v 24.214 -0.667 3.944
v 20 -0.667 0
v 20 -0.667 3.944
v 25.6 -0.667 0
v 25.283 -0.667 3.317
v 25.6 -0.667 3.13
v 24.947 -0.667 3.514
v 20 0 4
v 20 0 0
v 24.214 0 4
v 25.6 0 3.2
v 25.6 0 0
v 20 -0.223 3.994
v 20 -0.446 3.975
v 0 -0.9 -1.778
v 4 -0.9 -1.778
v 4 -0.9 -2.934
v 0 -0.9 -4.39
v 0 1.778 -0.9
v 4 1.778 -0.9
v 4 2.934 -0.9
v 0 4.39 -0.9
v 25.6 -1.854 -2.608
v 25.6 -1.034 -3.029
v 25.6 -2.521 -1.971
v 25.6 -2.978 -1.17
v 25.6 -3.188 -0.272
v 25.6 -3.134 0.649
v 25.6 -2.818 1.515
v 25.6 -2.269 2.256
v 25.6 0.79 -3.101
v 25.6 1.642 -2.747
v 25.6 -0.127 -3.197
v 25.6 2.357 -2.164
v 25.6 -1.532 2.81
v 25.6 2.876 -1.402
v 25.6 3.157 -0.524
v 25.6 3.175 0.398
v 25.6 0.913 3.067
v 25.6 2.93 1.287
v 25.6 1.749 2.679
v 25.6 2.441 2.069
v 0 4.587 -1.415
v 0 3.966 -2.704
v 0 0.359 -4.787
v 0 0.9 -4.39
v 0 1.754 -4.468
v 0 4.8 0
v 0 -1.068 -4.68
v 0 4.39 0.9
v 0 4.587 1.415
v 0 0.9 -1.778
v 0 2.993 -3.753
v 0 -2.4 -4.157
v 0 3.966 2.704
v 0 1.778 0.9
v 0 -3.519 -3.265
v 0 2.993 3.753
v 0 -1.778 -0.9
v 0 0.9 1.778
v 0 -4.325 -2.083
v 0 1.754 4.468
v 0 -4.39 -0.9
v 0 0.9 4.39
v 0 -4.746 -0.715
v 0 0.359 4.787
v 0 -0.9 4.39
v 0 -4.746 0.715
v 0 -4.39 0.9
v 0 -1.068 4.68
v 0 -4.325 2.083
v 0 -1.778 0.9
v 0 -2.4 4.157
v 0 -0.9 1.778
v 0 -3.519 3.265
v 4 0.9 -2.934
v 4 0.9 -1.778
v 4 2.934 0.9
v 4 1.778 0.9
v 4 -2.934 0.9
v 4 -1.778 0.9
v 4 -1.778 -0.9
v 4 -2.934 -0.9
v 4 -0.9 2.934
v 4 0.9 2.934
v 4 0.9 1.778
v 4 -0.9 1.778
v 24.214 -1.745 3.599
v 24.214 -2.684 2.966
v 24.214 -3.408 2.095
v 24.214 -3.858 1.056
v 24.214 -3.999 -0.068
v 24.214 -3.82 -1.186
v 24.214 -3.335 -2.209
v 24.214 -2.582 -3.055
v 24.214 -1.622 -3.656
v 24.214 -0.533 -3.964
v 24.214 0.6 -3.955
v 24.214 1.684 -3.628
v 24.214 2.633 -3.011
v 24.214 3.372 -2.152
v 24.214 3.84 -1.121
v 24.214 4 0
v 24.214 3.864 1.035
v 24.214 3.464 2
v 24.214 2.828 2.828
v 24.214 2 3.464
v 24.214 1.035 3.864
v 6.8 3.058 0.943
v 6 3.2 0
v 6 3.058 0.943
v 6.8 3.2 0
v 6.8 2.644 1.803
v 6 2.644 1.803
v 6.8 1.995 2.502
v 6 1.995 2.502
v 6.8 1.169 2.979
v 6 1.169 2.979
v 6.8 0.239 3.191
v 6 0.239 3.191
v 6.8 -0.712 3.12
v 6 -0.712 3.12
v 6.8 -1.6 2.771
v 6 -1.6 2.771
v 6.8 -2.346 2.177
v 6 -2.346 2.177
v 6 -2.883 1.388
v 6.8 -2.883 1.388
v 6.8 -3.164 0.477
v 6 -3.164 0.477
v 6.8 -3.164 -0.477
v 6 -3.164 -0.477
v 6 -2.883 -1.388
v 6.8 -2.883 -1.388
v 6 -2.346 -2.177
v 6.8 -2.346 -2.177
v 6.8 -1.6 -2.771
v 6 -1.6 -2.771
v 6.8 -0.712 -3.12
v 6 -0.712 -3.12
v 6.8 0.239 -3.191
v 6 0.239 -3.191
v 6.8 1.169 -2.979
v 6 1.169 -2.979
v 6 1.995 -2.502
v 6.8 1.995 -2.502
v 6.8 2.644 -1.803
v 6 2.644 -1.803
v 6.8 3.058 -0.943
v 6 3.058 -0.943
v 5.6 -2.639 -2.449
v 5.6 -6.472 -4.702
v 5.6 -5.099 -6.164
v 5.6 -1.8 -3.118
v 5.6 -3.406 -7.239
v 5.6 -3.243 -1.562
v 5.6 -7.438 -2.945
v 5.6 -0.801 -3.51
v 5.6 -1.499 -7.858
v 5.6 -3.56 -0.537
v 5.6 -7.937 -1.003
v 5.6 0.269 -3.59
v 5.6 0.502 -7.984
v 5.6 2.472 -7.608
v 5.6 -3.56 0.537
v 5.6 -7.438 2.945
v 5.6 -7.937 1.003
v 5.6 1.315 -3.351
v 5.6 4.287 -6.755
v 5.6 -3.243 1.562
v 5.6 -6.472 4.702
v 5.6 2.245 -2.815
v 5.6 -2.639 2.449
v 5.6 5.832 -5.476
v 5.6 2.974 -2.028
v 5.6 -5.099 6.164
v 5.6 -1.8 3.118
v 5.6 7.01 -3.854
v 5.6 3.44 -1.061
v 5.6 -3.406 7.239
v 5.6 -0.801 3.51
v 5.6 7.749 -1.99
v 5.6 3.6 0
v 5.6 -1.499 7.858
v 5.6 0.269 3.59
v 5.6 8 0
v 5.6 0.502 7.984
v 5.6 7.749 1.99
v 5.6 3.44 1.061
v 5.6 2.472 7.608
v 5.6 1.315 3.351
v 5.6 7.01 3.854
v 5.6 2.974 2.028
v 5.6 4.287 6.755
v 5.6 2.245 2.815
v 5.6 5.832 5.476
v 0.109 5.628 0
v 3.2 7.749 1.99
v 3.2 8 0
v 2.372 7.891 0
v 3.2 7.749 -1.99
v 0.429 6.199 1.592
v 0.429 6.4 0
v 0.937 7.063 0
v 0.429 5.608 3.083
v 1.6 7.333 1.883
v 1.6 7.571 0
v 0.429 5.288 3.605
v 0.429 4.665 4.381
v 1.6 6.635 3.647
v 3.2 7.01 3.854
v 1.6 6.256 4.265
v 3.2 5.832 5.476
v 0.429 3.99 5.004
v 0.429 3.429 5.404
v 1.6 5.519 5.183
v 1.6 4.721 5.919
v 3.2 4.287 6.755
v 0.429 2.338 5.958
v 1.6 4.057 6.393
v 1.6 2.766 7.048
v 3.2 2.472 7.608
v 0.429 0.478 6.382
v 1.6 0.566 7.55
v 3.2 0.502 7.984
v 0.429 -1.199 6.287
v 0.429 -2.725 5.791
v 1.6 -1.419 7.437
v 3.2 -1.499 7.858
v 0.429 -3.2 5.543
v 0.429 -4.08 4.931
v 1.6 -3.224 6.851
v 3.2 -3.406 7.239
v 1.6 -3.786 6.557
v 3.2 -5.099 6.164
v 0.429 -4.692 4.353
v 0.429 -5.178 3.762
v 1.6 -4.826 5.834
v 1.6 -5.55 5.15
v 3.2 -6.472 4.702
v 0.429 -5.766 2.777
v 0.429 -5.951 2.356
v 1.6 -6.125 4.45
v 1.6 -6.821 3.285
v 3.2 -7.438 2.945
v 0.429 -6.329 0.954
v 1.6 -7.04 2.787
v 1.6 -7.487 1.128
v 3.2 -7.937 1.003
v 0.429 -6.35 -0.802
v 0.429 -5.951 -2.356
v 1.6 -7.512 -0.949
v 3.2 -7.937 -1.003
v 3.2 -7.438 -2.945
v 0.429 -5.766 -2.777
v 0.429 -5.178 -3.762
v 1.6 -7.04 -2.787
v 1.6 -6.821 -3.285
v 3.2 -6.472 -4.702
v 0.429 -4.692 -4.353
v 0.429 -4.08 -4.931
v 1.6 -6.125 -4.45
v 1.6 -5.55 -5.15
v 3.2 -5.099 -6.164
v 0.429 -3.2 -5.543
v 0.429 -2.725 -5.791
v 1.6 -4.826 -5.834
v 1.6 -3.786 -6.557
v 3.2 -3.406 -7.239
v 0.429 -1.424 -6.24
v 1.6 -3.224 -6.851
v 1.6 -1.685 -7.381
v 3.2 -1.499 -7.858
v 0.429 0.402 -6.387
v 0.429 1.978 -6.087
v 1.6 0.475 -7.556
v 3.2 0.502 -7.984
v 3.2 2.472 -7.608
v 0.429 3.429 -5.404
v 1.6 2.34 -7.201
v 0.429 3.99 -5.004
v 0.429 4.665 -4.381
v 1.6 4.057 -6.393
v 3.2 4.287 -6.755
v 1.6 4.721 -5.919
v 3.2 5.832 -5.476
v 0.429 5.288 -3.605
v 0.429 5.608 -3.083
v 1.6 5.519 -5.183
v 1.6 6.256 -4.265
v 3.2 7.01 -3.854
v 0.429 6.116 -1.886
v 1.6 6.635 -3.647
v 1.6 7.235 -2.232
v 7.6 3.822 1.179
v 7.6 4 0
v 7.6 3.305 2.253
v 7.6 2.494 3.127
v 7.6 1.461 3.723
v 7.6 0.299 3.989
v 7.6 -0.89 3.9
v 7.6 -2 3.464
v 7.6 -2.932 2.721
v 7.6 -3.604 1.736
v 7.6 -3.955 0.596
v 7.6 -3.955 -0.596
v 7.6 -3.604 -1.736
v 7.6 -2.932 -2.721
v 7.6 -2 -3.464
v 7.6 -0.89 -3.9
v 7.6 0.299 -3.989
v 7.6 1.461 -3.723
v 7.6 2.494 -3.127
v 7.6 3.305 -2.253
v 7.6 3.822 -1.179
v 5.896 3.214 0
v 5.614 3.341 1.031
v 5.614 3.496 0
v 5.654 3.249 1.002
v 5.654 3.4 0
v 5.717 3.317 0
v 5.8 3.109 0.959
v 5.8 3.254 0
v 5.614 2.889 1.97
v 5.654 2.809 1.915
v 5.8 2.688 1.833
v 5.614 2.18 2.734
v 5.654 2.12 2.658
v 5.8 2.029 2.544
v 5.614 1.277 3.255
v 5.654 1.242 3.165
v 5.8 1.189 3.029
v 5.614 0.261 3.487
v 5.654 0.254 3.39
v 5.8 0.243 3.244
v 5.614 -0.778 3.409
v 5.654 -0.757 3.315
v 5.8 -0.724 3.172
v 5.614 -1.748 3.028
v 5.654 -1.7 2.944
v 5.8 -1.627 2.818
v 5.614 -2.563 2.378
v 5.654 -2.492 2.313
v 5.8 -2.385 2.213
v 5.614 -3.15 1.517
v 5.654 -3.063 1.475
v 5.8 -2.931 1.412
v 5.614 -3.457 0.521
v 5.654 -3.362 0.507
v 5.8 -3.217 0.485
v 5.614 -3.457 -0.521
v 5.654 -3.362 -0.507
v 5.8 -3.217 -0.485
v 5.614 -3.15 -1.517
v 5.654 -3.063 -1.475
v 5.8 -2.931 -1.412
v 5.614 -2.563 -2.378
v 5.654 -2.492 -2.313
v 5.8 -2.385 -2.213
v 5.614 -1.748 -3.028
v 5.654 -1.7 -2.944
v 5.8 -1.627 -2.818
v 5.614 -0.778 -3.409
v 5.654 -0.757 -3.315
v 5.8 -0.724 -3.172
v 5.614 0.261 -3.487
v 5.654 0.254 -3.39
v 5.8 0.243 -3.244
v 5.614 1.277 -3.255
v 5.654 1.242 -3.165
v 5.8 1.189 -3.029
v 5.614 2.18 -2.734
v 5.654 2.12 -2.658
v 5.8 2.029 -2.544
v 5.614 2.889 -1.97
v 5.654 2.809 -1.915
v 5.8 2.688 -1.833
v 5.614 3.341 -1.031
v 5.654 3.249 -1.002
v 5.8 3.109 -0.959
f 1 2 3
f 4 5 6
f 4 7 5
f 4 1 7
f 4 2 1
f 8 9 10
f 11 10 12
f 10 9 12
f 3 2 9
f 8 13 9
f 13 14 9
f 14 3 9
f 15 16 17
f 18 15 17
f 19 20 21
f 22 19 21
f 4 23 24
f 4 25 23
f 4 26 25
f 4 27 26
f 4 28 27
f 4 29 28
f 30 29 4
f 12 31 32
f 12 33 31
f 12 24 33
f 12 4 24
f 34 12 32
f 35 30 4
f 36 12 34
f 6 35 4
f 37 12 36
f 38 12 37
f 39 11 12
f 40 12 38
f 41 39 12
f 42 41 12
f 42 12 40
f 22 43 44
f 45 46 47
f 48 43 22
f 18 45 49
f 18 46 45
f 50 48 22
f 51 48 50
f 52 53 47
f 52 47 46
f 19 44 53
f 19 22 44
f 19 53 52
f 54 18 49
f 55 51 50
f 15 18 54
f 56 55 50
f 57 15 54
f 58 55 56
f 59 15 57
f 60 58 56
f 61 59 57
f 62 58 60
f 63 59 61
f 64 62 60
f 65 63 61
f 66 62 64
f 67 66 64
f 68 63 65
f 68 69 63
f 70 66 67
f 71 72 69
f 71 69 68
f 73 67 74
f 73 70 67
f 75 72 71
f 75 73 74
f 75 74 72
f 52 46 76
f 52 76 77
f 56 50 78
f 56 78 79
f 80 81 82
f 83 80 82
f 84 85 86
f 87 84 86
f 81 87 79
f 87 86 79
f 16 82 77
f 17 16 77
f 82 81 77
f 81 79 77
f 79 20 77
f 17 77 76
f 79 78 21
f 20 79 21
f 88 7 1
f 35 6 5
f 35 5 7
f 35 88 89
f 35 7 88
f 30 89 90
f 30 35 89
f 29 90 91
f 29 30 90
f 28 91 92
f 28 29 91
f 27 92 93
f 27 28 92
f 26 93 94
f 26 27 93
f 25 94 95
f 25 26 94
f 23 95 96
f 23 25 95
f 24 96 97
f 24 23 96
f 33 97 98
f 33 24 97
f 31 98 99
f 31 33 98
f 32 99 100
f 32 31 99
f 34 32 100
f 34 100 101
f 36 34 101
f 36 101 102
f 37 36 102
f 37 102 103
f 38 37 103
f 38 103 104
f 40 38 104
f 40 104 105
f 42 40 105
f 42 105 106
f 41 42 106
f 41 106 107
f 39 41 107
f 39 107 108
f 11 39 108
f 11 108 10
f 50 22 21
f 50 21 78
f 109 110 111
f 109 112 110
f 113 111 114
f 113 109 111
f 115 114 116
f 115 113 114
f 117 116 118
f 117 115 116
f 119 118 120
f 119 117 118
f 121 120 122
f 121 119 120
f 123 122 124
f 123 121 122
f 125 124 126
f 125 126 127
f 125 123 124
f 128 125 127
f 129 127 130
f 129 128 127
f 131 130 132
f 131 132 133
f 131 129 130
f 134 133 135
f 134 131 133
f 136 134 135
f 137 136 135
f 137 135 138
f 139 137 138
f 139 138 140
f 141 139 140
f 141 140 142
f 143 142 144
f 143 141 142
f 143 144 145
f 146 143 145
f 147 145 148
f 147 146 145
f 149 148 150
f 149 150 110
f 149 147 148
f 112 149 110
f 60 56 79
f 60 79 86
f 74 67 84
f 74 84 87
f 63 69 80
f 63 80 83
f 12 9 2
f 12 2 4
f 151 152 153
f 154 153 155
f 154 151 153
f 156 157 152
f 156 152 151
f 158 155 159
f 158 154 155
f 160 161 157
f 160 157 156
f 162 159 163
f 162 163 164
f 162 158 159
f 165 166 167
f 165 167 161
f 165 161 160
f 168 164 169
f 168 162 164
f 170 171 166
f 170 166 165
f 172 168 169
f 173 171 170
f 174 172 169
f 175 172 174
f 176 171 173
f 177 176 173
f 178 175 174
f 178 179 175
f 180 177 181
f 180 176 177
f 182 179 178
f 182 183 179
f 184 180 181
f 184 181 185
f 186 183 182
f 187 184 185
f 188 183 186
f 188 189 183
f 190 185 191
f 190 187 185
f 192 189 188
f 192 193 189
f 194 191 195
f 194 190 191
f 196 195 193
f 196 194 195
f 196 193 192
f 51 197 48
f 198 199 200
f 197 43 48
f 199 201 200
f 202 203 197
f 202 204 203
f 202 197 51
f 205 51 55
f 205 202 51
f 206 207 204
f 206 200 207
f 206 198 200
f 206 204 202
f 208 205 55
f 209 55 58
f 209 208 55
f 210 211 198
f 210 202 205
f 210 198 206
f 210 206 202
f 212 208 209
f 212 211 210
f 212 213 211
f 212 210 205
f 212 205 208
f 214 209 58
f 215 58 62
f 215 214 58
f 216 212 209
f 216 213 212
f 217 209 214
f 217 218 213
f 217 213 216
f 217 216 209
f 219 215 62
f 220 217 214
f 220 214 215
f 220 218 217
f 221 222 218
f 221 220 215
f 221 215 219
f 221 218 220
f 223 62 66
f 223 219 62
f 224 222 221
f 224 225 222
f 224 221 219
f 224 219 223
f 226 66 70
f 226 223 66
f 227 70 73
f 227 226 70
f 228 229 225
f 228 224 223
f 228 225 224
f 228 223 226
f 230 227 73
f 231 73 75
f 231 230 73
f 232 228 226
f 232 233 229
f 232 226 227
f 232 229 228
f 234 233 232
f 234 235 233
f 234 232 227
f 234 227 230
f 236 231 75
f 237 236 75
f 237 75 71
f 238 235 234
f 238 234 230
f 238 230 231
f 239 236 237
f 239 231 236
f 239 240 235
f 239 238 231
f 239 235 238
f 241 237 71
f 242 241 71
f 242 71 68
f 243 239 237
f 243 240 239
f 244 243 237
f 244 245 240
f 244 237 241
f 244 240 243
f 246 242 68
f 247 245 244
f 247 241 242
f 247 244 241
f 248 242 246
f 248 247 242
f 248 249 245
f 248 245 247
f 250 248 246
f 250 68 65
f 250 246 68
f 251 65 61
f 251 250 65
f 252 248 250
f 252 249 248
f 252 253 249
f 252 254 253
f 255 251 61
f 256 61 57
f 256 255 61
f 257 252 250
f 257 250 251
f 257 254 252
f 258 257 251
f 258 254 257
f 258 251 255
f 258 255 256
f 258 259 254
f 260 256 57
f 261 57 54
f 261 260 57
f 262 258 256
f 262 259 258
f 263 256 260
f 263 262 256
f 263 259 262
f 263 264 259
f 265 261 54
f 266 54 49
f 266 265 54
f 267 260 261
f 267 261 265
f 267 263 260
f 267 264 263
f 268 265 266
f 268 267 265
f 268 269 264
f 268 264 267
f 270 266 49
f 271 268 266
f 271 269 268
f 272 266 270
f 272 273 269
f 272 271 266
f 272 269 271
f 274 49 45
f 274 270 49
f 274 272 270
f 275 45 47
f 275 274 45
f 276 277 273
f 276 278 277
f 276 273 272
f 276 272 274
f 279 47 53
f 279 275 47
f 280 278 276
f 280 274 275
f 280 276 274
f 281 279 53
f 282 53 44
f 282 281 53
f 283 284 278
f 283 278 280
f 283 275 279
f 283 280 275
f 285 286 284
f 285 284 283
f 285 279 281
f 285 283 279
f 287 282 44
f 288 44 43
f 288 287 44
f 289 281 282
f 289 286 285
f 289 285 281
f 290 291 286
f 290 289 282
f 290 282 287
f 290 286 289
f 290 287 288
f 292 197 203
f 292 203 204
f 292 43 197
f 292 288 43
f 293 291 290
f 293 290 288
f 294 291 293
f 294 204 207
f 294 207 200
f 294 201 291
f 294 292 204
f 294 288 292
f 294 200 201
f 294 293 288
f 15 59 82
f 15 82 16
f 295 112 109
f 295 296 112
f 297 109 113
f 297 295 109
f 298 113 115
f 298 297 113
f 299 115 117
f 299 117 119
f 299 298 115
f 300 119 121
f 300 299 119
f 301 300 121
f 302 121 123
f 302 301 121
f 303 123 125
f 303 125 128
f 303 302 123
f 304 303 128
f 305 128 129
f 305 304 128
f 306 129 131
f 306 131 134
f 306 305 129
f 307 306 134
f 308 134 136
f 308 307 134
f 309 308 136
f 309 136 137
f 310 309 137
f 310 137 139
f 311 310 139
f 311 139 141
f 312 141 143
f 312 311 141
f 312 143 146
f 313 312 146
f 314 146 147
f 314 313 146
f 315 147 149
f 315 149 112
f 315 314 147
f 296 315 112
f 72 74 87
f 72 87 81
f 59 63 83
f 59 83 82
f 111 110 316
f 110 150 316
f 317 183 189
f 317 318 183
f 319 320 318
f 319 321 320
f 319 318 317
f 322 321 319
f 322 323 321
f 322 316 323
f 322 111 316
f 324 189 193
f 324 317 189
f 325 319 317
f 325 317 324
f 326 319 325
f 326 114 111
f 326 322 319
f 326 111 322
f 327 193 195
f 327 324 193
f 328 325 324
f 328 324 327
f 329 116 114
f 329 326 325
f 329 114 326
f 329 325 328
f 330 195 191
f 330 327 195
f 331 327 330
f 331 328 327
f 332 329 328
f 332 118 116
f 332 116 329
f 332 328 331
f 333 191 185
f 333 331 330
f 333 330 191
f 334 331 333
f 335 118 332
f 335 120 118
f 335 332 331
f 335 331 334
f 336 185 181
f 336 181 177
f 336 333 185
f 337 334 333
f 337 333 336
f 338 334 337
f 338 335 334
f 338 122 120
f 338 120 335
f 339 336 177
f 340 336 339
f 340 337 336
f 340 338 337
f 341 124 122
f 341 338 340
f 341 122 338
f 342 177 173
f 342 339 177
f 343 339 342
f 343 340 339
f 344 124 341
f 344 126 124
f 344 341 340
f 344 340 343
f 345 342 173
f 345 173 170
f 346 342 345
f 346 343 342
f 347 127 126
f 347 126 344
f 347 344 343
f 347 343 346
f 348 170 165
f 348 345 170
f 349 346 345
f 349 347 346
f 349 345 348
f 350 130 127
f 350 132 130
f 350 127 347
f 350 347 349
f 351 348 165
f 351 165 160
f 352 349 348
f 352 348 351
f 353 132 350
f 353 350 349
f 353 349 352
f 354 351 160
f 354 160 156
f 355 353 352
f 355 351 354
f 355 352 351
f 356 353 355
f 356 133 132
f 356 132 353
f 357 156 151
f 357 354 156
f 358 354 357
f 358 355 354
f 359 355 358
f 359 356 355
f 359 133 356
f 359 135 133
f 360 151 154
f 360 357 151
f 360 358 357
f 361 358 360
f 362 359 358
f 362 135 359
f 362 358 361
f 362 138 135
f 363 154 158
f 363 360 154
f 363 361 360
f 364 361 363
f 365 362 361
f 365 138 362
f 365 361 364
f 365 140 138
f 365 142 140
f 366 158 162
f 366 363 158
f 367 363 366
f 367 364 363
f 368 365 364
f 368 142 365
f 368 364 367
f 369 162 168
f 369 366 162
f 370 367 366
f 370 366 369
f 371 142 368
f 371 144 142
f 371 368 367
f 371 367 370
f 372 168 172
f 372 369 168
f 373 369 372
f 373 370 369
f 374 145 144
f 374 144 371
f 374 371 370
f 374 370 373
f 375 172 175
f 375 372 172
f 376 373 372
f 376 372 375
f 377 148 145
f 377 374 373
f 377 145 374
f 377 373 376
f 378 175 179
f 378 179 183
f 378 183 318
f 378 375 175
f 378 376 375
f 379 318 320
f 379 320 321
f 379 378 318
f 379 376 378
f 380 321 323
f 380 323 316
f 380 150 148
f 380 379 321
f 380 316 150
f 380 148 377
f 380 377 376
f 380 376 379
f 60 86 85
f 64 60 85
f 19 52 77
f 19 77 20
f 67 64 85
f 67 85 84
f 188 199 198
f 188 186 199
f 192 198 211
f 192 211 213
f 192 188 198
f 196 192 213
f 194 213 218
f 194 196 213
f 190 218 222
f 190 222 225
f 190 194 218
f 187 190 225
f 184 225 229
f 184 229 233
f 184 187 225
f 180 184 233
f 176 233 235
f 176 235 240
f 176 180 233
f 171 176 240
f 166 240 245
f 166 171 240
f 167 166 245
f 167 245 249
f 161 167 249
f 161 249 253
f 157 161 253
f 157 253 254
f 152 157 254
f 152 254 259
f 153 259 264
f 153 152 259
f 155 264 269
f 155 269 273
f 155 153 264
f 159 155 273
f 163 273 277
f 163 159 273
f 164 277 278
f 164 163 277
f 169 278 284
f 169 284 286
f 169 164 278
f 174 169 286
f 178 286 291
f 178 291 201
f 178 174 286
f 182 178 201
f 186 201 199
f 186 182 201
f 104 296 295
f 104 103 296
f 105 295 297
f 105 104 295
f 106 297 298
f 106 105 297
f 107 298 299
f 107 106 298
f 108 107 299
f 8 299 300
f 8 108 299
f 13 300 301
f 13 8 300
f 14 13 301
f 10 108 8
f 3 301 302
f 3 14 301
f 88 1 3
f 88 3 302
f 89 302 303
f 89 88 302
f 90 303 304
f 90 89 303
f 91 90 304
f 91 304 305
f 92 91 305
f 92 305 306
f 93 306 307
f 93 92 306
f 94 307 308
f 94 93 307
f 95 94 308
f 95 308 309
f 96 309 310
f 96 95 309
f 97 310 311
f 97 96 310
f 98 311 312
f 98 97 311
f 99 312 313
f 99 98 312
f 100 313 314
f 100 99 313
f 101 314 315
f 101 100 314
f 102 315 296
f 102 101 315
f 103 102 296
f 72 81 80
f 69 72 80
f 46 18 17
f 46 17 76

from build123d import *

# Parameters (mm, degrees)
CUT_EXTRUDE3_DEPTH         = 4
DRAFT1_ANGLE               = 20
RECESSI_CUT_EXTRUDE5_DEPTH = 4
SKETCH11_W                 = 5.6
SKETCH11_H                 = 0.666666667
POINT_CUT_EXTRUDE8_DEPTH   = 9


with BuildPart() as part:
    # Sketch1 → base-Revolve (revolve)
    with BuildSketch(Plane.XY):
        with BuildLine():
            Line((0, 0), (0, 4.8))
            ThreePointArc((0, 4.8), (0.9372583, 7.0627417), (3.2, 8))
            Line((3.2, 8), (5.6, 8))
            Line((5.6, 8), (5.6, 3.6))
            ThreePointArc((5.6, 3.6), (5.717157288, 3.317157288), (6, 3.2))
            Line((6, 3.2), (6.8, 3.2))
            Line((6.8, 3.2), (7.6, 4))
            Line((7.6, 4), (25.6, 4))
            Line((25.6, 4), (25.6, 0))
            Line((25.6, 0), (0, 0))
        make_face()
    revolve(axis=Axis((0, 0, 0), (1, 0, 0)))

    # Sketch4 → Cut-Extrude3 (cut)
    with BuildSketch(Plane(origin=(0, 0, 0), x_dir=(0, 0, -1), z_dir=(1, 0, 0))):
        Polygon((0.9, 4.39), (-0.9, 4.39), (-0.9, 0.9), (-4.39, 0.9), (-4.39, -0.9), (-0.9, -0.9), (-0.9, -4.39), (0.9, -4.39), (0.9, -0.9), (4.39, -0.9), (4.39, 0.9), (0.9, 0.9), align=None)
    extrude(amount=CUT_EXTRUDE3_DEPTH, mode=Mode.SUBTRACT)

    # Draft1
    draft1_faces = [part.faces().sort_by_distance(p)[0] for p in [
        (2, 0, -4.39),
        (2, -4.39, 0),
        (2, 0, 4.39),
        (2, 4.39, 0),
    ]]
    draft(draft1_faces, Plane(origin=(0, 0, 0), x_dir=(0, 0, -1), z_dir=(-1, 0, 0)), DRAFT1_ANGLE)

    # Sketch5 → recessI_Cut-Extrude5 (cut)
    with BuildSketch(Plane.ZY):
        Polygon((0.9, 1.778), (1.778, 0.9), (0.9, 0.9), align=None)
        Polygon((-0.9, 0.9), (-1.778, 0.9), (-0.9, 1.778), align=None)
        Polygon((-0.9, -1.778), (-1.778, -0.9), (-0.9, -0.9), align=None)
        Polygon((0.9, -0.9), (1.778, -0.9), (0.9, -1.778), align=None)
    extrude(amount=-RECESSI_CUT_EXTRUDE5_DEPTH, mode=Mode.SUBTRACT)

    # Sketch8 → point_Cut-Revolve1 (revolve, cut)
    with BuildSketch(Plane.XY):
        Polygon((25.6, 0), (26.108, 0), (26.108, 4.508), (24.214359354, 4.508), (24.214359354, 4), (25.6, 3.2), align=None)
    revolve(axis=Axis((0, 0, 0), (1, 0, 0)), mode=Mode.SUBTRACT)

    # Sketch11 → point_Cut-Extrude8 (cut, through all)
    with BuildSketch(Plane.XY):
        with Locations((22.8, -0.333333333)):
            Rectangle(SKETCH11_W, SKETCH11_H)
    extrude(amount=POINT_CUT_EXTRUDE8_DEPTH, mode=Mode.SUBTRACT)


solid = part.part
